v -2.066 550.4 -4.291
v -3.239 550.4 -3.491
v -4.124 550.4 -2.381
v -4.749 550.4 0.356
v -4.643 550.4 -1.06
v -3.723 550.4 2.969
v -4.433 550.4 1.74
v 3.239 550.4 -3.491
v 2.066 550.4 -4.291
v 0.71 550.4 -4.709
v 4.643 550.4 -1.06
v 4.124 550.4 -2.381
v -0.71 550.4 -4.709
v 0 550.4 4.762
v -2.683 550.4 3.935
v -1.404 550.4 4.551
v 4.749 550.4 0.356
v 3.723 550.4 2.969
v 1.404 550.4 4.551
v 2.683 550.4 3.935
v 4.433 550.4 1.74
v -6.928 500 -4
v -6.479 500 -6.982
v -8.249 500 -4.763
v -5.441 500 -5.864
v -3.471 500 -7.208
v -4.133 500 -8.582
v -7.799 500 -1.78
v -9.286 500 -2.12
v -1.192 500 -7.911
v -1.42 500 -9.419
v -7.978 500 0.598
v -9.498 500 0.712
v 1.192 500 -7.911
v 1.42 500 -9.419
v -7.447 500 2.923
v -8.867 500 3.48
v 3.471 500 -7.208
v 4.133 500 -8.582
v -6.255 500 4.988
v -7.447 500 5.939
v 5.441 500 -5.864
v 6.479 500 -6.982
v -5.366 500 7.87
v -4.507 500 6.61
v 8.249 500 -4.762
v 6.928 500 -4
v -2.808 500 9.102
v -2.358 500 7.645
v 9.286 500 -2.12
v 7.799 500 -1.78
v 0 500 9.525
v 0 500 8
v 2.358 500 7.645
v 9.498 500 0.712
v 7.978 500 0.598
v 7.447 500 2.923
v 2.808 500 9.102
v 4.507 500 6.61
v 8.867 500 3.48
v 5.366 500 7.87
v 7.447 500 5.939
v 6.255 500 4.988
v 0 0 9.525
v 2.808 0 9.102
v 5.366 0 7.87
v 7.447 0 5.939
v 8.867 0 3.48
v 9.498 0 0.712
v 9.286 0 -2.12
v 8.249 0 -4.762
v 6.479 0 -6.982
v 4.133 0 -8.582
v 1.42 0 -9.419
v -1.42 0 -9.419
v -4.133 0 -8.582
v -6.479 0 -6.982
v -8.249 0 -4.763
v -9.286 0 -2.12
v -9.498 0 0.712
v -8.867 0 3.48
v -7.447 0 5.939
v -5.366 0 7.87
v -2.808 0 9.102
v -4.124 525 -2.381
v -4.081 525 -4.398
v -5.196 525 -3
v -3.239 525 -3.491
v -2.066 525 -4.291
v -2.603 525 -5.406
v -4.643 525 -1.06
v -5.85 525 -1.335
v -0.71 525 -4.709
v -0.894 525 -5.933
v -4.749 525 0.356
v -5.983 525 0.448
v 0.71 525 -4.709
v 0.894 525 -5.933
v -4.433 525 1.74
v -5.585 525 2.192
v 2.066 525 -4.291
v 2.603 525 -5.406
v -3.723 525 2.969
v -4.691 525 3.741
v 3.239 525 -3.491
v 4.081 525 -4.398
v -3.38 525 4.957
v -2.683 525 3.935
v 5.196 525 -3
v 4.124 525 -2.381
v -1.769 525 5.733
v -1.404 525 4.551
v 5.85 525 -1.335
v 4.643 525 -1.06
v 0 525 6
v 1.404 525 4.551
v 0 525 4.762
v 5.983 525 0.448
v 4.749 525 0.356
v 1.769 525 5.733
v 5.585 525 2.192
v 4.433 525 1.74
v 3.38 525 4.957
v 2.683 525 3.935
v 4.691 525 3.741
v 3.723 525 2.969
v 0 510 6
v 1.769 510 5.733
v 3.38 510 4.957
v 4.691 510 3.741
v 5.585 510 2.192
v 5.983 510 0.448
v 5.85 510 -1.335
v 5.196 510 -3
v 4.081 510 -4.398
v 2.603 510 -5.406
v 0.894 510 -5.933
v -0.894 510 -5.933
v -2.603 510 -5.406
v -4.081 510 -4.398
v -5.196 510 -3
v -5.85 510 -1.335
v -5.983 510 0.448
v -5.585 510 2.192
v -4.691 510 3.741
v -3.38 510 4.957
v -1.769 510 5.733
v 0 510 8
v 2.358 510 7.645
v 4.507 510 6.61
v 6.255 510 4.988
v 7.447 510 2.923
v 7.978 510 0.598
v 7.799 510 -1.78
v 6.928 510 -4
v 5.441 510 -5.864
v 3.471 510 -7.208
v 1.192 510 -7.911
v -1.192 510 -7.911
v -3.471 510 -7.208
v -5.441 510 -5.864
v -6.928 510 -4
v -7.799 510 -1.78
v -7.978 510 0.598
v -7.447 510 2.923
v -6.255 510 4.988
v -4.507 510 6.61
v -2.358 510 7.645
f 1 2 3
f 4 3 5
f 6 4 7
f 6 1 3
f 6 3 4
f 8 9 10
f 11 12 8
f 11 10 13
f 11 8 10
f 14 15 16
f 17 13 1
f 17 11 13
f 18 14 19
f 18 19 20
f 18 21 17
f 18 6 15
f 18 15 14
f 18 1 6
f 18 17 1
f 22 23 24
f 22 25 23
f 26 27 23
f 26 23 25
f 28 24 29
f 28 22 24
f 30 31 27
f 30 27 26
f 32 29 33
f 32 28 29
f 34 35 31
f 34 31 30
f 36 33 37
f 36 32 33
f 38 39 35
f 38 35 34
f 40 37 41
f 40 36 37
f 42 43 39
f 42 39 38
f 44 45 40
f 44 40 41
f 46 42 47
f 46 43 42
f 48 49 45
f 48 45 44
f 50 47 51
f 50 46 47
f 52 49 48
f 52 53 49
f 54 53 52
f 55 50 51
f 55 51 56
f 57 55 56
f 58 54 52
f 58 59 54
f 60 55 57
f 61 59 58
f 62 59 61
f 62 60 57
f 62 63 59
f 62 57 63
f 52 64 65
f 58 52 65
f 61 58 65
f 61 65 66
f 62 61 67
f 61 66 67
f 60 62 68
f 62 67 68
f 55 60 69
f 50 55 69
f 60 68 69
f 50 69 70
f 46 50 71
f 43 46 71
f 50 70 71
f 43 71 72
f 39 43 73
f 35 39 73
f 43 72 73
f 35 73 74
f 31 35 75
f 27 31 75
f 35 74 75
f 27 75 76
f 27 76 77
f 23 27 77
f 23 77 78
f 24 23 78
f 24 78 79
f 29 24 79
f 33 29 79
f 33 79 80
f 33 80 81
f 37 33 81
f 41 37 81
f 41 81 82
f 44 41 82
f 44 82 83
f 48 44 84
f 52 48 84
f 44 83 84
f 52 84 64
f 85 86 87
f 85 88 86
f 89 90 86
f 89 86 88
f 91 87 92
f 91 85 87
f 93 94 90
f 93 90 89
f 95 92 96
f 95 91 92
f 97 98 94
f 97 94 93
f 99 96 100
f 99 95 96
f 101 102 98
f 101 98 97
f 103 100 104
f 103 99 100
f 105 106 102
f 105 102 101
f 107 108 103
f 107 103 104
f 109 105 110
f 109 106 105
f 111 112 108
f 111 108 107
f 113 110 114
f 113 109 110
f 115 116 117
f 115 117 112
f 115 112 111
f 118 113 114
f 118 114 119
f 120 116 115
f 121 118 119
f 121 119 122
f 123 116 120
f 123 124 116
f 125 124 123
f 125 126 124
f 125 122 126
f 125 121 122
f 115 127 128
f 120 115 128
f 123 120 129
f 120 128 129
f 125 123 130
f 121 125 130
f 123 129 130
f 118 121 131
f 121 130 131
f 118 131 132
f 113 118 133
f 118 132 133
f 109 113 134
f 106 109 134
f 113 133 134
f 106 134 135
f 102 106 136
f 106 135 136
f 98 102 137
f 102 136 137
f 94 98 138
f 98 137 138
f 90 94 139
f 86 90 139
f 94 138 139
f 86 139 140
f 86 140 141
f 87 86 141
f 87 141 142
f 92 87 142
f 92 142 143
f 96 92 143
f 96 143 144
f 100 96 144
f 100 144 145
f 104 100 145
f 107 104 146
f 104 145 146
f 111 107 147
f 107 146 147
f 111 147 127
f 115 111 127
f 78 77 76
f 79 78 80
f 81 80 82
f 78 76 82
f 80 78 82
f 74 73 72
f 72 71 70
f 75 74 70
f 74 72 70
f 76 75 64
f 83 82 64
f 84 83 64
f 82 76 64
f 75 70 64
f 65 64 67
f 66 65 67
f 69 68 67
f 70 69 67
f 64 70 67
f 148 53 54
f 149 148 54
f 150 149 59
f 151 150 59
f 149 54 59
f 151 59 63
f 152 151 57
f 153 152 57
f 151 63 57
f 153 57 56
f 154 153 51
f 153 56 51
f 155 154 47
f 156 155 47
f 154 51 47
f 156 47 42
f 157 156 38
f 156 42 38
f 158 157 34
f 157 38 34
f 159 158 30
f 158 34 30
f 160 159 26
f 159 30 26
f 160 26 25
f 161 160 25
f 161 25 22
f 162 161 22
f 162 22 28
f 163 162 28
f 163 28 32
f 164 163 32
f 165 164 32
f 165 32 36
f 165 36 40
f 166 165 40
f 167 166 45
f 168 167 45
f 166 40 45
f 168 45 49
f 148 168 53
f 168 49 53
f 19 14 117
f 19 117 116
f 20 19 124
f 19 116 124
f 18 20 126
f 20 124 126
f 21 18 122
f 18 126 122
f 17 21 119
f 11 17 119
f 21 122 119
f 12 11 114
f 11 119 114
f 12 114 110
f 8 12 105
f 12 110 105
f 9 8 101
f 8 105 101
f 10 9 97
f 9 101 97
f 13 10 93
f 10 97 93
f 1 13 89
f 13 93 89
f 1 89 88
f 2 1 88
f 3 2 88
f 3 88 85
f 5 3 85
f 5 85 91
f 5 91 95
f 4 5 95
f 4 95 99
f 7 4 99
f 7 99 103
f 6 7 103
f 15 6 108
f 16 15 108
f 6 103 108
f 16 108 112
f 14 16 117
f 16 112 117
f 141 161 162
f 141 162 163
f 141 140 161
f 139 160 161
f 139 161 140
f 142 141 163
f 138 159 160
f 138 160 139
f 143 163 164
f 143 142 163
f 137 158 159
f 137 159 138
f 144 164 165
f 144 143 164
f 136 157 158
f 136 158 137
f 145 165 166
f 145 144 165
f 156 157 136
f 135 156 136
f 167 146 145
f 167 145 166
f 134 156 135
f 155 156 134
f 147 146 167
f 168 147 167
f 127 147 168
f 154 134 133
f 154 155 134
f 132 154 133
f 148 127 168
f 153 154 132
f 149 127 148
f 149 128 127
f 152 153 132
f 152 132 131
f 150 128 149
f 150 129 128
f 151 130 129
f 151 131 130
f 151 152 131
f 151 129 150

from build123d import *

# Parameters (mm, degrees)
SKETCH1_R           = 9.525
BOSS_EXTRUDE1_DEPTH = 500
SKETCH2_R           = 8
BOSS_EXTRUDE2_DEPTH = 10
SKETCH3_R           = 6
BOSS_EXTRUDE3_DEPTH = 15
SKETCH4_R           = 4.7625
BOSS_EXTRUDE4_DEPTH = 25.4


with BuildPart() as part:
    # Sketch1 → Boss-Extrude1 (new body)
    with BuildSketch(Plane(origin=(0, 0, 0), x_dir=(1, 0, 0), z_dir=(0, 1, 0))):
        with Locations(Location((0, 0, 0), (0, 0, 270))):
            Circle(SKETCH1_R)
    extrude(amount=BOSS_EXTRUDE1_DEPTH)

    # Sketch2 → Boss-Extrude2 (add)
    with BuildSketch(Plane(origin=(0, 500, 0), x_dir=(1, 0, 0), z_dir=(0, 1, 0))):
        with Locations(Location((0, 0, 0), (0, 0, 270))):
            Circle(SKETCH2_R)
    extrude(amount=BOSS_EXTRUDE2_DEPTH)

    # Sketch3 → Boss-Extrude3 (add)
    with BuildSketch(Plane(origin=(0, 510, 0), x_dir=(1, 0, 0), z_dir=(0, 1, 0))):
        with Locations(Location((0, 0, 0), (0, 0, 270))):
            Circle(SKETCH3_R)
    extrude(amount=BOSS_EXTRUDE3_DEPTH)

    # Sketch4 → Boss-Extrude4 (add)
    with BuildSketch(Plane(origin=(0, 525, 0), x_dir=(1, 0, 0), z_dir=(0, 1, 0))):
        with Locations(Location((0, 0, 0), (0, 0, 270))):
            Circle(SKETCH4_R)
    extrude(amount=BOSS_EXTRUDE4_DEPTH)


solid = part.part
